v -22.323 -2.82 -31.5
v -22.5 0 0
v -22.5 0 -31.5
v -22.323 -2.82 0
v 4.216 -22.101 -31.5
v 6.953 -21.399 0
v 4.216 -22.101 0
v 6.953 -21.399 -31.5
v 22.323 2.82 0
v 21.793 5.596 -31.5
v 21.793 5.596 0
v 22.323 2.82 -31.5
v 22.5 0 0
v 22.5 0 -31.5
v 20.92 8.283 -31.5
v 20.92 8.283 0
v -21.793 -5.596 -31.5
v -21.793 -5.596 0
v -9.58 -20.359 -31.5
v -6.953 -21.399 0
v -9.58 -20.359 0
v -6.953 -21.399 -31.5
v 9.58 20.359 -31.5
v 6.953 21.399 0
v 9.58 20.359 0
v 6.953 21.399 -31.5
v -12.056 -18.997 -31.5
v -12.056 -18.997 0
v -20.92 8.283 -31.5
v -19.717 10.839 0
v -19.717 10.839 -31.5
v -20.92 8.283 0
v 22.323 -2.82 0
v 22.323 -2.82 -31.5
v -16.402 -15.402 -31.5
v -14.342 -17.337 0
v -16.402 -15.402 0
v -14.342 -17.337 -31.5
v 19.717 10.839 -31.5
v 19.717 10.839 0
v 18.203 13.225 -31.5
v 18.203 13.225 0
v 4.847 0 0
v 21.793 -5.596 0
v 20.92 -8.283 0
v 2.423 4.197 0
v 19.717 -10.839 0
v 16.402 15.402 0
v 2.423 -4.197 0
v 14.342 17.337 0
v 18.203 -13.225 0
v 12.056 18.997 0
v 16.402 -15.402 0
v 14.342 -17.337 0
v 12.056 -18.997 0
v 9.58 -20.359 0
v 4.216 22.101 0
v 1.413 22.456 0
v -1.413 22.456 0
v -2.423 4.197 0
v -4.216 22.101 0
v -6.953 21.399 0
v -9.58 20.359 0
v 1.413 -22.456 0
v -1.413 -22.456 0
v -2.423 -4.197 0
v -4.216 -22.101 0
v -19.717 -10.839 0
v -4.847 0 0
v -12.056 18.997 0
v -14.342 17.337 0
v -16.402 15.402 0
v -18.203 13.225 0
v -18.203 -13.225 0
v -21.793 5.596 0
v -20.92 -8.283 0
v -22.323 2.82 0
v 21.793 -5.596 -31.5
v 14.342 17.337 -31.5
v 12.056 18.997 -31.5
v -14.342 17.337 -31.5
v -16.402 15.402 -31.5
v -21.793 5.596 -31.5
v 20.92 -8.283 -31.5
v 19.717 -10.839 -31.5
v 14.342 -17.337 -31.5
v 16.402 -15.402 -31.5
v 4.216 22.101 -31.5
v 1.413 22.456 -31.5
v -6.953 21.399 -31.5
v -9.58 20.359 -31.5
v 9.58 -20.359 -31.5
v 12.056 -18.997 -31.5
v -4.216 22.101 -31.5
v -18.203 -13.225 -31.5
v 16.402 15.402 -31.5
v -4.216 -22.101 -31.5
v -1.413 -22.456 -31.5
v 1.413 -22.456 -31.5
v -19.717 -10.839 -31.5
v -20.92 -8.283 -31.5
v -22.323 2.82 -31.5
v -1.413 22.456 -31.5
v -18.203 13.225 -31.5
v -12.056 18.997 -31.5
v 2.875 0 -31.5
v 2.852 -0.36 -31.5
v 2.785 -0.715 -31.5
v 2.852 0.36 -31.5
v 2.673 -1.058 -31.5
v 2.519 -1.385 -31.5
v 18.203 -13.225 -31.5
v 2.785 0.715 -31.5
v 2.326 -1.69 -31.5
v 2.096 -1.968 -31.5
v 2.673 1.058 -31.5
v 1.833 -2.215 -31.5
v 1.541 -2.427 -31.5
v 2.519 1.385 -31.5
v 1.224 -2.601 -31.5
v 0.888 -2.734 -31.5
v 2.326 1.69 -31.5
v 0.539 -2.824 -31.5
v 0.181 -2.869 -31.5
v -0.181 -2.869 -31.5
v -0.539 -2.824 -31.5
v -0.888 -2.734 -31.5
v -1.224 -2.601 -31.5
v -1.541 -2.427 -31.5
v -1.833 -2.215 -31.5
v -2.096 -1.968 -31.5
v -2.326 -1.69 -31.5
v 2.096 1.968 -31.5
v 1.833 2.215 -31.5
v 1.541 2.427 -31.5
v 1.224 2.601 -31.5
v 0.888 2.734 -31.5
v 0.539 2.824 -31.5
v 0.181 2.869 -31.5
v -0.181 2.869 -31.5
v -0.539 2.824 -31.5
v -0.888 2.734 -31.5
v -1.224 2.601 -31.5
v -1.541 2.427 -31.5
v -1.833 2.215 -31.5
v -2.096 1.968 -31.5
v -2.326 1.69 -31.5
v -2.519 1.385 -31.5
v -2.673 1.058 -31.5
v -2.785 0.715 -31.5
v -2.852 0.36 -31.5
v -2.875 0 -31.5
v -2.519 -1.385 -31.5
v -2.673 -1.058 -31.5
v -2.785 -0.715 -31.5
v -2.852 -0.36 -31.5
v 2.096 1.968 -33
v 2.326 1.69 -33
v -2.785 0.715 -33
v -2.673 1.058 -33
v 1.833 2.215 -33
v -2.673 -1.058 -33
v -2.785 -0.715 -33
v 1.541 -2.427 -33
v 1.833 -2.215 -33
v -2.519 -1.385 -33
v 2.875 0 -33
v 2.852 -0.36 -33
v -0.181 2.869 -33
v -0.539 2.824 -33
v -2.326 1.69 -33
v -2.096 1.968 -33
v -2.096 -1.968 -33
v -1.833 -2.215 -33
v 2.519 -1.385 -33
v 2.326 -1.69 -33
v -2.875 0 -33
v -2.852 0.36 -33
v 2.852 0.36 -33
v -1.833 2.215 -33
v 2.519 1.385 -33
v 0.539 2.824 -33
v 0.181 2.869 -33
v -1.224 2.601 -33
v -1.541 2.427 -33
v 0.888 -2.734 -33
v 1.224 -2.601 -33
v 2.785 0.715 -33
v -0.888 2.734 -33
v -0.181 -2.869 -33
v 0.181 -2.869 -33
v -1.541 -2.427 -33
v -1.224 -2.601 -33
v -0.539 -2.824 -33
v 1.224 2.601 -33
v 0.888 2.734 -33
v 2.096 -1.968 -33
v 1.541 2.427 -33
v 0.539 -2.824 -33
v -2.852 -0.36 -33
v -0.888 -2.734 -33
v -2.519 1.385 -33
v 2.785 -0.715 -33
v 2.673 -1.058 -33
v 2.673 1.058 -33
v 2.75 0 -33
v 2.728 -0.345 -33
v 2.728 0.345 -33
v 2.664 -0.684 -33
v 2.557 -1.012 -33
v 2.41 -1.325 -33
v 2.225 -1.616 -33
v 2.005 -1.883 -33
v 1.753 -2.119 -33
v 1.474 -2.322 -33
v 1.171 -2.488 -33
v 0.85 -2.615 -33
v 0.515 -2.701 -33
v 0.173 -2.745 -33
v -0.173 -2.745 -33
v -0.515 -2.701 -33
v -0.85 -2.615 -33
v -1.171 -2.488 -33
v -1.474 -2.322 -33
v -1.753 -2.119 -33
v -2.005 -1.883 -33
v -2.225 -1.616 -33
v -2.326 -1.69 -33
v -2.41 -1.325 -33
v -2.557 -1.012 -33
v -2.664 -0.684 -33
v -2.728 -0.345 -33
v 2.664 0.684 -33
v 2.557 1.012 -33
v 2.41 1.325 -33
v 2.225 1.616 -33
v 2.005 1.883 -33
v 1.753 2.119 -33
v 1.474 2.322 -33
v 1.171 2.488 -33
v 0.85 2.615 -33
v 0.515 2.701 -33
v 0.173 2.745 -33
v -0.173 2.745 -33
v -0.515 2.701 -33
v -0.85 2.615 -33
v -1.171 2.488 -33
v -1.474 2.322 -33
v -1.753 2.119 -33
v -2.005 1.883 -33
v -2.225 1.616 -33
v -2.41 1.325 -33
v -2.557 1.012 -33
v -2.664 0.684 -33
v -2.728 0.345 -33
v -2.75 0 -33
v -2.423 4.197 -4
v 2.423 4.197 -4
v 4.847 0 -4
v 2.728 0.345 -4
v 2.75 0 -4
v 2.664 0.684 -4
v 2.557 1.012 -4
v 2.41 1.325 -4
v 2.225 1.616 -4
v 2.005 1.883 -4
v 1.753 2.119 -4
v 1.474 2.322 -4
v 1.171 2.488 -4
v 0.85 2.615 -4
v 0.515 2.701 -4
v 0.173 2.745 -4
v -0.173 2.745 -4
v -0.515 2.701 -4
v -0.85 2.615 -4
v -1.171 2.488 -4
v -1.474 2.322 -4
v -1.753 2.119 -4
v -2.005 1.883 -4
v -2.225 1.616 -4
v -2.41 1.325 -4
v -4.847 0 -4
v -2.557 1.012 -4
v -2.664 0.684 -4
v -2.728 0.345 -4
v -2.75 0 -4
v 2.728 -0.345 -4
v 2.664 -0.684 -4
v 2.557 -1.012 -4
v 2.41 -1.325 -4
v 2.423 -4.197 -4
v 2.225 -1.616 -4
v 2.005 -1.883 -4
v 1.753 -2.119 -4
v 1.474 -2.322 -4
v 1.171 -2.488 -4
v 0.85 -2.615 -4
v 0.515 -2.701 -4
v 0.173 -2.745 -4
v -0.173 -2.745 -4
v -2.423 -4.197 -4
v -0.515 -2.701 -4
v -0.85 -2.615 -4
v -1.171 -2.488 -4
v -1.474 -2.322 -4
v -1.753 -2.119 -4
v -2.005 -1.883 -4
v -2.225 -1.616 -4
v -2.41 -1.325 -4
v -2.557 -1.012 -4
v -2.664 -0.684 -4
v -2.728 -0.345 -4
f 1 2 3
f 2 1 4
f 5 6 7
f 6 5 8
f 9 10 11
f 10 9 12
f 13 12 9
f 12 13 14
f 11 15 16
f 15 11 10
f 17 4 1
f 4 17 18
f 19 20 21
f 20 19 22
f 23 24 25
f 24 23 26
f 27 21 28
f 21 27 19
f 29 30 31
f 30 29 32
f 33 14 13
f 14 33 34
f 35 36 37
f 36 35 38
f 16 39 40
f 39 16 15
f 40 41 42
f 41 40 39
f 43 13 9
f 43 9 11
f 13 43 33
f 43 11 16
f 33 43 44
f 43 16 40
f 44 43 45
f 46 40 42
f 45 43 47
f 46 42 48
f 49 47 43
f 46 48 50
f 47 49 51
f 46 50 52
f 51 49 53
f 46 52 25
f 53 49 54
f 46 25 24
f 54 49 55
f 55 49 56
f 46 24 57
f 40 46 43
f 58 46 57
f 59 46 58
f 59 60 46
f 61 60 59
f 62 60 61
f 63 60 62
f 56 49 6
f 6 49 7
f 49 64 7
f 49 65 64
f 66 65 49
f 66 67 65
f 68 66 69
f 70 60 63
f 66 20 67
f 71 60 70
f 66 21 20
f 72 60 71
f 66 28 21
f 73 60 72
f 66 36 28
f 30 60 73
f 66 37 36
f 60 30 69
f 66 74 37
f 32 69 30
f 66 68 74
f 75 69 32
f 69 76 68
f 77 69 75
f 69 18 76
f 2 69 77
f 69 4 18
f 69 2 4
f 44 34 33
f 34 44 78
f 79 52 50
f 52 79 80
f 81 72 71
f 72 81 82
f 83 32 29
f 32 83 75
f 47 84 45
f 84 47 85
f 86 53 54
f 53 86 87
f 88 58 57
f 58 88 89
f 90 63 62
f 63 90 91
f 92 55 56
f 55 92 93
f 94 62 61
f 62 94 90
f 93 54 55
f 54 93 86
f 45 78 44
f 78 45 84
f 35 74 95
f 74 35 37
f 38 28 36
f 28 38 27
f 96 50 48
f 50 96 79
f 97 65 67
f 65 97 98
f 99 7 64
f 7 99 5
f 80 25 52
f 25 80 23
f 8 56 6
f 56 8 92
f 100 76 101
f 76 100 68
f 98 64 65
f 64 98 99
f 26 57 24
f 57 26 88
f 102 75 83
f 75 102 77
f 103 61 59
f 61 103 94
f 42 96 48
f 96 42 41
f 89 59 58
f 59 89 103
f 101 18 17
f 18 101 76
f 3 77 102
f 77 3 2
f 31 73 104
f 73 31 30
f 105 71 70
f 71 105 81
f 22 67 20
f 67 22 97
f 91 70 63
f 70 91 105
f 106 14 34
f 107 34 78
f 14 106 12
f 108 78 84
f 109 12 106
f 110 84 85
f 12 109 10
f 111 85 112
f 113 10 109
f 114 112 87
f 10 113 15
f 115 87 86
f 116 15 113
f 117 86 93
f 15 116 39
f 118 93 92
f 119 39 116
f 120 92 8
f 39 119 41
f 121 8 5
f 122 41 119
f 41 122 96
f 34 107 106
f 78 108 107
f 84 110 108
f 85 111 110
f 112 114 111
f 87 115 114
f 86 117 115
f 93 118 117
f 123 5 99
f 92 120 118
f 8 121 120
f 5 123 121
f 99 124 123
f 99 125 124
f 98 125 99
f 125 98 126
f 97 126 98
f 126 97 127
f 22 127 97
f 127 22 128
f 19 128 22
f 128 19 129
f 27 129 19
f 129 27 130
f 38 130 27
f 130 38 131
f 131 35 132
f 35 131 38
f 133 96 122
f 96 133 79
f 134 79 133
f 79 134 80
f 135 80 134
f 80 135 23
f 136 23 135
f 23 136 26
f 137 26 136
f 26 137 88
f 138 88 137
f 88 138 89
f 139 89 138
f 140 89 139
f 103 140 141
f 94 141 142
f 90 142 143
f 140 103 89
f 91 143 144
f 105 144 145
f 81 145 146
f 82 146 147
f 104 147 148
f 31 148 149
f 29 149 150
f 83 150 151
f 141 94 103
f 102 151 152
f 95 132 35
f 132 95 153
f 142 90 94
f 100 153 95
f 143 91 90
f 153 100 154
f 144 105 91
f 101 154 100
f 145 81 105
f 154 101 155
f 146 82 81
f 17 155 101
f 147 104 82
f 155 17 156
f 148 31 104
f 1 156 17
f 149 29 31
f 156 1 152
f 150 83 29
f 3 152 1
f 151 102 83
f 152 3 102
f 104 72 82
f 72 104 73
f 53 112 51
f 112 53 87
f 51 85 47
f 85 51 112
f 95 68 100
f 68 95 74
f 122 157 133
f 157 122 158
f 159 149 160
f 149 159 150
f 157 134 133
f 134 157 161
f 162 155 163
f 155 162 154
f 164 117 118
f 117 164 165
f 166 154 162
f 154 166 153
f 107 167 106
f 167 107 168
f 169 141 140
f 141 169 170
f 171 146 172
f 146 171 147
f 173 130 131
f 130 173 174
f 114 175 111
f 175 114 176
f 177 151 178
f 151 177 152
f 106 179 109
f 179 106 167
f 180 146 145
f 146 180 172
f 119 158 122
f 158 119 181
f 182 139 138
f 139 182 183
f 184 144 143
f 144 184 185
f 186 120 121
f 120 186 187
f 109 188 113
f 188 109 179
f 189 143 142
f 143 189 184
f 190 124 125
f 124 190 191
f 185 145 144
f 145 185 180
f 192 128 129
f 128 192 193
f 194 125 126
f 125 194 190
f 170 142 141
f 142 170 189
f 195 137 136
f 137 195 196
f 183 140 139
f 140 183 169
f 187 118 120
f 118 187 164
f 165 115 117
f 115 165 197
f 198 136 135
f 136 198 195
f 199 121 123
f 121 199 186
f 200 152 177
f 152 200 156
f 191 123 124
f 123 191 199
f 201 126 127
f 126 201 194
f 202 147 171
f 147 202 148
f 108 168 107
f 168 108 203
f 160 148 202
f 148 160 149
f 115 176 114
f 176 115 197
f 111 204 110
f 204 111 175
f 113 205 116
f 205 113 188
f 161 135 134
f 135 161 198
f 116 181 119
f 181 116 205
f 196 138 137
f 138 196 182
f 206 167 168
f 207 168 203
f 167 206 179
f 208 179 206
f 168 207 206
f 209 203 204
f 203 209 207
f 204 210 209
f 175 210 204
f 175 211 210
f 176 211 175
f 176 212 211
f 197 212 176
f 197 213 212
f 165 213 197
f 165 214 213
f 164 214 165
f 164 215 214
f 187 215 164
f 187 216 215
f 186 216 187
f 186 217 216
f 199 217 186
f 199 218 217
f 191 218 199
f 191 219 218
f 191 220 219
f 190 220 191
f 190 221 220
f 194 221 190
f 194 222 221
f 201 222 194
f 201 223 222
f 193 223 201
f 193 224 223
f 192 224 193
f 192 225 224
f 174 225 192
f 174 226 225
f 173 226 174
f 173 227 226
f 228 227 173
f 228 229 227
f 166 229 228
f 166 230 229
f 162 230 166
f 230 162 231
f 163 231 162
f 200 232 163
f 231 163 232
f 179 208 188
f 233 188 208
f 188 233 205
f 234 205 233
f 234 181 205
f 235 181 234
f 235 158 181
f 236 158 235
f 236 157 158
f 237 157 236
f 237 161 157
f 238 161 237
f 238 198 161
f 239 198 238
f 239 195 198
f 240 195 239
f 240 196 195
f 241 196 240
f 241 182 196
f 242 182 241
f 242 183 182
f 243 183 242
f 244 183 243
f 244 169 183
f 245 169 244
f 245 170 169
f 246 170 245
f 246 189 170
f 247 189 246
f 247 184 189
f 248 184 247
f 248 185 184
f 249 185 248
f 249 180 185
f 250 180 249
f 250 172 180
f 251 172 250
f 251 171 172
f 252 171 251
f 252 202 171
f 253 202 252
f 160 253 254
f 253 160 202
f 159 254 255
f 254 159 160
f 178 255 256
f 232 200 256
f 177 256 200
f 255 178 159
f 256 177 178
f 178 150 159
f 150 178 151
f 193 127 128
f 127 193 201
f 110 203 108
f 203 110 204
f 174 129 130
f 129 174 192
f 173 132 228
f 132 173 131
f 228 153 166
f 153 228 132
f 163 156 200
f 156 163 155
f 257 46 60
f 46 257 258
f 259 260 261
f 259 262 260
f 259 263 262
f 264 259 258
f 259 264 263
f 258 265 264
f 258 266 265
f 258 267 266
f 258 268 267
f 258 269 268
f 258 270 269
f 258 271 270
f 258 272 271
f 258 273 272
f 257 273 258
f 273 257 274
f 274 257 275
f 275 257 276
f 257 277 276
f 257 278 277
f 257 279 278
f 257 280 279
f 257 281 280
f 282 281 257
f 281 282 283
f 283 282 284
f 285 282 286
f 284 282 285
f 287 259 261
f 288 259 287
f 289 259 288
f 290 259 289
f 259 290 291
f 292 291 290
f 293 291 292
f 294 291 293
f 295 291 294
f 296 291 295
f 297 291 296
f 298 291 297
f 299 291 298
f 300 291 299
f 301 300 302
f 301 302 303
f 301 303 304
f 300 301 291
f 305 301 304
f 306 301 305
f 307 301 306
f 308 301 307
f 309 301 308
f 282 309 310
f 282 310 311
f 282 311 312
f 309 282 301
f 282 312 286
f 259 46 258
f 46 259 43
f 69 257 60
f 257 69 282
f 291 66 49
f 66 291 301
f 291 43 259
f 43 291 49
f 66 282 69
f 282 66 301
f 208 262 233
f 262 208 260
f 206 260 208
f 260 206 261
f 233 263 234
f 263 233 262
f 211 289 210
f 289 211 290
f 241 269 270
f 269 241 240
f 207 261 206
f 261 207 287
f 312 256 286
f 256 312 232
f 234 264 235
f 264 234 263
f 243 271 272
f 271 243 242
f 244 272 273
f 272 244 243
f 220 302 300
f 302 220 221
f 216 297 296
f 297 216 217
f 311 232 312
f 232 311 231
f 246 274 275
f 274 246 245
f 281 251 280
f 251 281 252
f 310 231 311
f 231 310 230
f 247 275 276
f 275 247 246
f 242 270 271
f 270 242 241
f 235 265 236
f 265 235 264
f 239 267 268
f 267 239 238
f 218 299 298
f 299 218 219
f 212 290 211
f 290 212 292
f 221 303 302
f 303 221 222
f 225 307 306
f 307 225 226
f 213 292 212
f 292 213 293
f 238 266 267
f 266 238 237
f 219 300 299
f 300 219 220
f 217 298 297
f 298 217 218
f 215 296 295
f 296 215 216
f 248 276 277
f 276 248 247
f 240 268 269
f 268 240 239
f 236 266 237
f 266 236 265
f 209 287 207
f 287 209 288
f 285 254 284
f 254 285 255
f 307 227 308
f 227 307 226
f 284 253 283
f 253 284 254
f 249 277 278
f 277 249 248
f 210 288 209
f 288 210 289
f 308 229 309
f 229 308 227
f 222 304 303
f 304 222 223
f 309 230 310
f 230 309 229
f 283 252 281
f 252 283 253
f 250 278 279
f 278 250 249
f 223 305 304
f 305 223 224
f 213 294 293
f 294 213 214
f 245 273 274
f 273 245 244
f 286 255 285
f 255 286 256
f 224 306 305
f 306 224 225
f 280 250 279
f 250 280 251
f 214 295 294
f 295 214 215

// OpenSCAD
$fn = 50;


difference() {
	union() {
		translate(v = [0, 0, -31.5000000000]) {
			cylinder(h = 31.5000000000, r = 22.5000000000);
		}
		#translate(v = [0, 0, -33.0000000000]) {
			cylinder(h = 33, r = 2.8750000000);
		}
	}
	union() {
		translate(v = [0, 0, 0]) {
			rotate(a = [0, 0, 0]) {
				difference() {
					union() {
						translate(v = [0, 0, -4]) {
							linear_extrude(height = 4) {
								polygon(points = [[4.8468000000, 0.0000000000], [2.4234000000, 4.1974519271], [-2.4234000000, 4.1974519271], [-4.8468000000, 0.0000000000], [-2.4234000000, -4.1974519271], [2.4234000000, -4.1974519271]]);
							}
						}
					}
					union();
				}
			}
		}
		#translate(v = [0, 0, -100.0000000000]) {
			cylinder(h = 200, r = 2.7500000000);
		}
	}
}
